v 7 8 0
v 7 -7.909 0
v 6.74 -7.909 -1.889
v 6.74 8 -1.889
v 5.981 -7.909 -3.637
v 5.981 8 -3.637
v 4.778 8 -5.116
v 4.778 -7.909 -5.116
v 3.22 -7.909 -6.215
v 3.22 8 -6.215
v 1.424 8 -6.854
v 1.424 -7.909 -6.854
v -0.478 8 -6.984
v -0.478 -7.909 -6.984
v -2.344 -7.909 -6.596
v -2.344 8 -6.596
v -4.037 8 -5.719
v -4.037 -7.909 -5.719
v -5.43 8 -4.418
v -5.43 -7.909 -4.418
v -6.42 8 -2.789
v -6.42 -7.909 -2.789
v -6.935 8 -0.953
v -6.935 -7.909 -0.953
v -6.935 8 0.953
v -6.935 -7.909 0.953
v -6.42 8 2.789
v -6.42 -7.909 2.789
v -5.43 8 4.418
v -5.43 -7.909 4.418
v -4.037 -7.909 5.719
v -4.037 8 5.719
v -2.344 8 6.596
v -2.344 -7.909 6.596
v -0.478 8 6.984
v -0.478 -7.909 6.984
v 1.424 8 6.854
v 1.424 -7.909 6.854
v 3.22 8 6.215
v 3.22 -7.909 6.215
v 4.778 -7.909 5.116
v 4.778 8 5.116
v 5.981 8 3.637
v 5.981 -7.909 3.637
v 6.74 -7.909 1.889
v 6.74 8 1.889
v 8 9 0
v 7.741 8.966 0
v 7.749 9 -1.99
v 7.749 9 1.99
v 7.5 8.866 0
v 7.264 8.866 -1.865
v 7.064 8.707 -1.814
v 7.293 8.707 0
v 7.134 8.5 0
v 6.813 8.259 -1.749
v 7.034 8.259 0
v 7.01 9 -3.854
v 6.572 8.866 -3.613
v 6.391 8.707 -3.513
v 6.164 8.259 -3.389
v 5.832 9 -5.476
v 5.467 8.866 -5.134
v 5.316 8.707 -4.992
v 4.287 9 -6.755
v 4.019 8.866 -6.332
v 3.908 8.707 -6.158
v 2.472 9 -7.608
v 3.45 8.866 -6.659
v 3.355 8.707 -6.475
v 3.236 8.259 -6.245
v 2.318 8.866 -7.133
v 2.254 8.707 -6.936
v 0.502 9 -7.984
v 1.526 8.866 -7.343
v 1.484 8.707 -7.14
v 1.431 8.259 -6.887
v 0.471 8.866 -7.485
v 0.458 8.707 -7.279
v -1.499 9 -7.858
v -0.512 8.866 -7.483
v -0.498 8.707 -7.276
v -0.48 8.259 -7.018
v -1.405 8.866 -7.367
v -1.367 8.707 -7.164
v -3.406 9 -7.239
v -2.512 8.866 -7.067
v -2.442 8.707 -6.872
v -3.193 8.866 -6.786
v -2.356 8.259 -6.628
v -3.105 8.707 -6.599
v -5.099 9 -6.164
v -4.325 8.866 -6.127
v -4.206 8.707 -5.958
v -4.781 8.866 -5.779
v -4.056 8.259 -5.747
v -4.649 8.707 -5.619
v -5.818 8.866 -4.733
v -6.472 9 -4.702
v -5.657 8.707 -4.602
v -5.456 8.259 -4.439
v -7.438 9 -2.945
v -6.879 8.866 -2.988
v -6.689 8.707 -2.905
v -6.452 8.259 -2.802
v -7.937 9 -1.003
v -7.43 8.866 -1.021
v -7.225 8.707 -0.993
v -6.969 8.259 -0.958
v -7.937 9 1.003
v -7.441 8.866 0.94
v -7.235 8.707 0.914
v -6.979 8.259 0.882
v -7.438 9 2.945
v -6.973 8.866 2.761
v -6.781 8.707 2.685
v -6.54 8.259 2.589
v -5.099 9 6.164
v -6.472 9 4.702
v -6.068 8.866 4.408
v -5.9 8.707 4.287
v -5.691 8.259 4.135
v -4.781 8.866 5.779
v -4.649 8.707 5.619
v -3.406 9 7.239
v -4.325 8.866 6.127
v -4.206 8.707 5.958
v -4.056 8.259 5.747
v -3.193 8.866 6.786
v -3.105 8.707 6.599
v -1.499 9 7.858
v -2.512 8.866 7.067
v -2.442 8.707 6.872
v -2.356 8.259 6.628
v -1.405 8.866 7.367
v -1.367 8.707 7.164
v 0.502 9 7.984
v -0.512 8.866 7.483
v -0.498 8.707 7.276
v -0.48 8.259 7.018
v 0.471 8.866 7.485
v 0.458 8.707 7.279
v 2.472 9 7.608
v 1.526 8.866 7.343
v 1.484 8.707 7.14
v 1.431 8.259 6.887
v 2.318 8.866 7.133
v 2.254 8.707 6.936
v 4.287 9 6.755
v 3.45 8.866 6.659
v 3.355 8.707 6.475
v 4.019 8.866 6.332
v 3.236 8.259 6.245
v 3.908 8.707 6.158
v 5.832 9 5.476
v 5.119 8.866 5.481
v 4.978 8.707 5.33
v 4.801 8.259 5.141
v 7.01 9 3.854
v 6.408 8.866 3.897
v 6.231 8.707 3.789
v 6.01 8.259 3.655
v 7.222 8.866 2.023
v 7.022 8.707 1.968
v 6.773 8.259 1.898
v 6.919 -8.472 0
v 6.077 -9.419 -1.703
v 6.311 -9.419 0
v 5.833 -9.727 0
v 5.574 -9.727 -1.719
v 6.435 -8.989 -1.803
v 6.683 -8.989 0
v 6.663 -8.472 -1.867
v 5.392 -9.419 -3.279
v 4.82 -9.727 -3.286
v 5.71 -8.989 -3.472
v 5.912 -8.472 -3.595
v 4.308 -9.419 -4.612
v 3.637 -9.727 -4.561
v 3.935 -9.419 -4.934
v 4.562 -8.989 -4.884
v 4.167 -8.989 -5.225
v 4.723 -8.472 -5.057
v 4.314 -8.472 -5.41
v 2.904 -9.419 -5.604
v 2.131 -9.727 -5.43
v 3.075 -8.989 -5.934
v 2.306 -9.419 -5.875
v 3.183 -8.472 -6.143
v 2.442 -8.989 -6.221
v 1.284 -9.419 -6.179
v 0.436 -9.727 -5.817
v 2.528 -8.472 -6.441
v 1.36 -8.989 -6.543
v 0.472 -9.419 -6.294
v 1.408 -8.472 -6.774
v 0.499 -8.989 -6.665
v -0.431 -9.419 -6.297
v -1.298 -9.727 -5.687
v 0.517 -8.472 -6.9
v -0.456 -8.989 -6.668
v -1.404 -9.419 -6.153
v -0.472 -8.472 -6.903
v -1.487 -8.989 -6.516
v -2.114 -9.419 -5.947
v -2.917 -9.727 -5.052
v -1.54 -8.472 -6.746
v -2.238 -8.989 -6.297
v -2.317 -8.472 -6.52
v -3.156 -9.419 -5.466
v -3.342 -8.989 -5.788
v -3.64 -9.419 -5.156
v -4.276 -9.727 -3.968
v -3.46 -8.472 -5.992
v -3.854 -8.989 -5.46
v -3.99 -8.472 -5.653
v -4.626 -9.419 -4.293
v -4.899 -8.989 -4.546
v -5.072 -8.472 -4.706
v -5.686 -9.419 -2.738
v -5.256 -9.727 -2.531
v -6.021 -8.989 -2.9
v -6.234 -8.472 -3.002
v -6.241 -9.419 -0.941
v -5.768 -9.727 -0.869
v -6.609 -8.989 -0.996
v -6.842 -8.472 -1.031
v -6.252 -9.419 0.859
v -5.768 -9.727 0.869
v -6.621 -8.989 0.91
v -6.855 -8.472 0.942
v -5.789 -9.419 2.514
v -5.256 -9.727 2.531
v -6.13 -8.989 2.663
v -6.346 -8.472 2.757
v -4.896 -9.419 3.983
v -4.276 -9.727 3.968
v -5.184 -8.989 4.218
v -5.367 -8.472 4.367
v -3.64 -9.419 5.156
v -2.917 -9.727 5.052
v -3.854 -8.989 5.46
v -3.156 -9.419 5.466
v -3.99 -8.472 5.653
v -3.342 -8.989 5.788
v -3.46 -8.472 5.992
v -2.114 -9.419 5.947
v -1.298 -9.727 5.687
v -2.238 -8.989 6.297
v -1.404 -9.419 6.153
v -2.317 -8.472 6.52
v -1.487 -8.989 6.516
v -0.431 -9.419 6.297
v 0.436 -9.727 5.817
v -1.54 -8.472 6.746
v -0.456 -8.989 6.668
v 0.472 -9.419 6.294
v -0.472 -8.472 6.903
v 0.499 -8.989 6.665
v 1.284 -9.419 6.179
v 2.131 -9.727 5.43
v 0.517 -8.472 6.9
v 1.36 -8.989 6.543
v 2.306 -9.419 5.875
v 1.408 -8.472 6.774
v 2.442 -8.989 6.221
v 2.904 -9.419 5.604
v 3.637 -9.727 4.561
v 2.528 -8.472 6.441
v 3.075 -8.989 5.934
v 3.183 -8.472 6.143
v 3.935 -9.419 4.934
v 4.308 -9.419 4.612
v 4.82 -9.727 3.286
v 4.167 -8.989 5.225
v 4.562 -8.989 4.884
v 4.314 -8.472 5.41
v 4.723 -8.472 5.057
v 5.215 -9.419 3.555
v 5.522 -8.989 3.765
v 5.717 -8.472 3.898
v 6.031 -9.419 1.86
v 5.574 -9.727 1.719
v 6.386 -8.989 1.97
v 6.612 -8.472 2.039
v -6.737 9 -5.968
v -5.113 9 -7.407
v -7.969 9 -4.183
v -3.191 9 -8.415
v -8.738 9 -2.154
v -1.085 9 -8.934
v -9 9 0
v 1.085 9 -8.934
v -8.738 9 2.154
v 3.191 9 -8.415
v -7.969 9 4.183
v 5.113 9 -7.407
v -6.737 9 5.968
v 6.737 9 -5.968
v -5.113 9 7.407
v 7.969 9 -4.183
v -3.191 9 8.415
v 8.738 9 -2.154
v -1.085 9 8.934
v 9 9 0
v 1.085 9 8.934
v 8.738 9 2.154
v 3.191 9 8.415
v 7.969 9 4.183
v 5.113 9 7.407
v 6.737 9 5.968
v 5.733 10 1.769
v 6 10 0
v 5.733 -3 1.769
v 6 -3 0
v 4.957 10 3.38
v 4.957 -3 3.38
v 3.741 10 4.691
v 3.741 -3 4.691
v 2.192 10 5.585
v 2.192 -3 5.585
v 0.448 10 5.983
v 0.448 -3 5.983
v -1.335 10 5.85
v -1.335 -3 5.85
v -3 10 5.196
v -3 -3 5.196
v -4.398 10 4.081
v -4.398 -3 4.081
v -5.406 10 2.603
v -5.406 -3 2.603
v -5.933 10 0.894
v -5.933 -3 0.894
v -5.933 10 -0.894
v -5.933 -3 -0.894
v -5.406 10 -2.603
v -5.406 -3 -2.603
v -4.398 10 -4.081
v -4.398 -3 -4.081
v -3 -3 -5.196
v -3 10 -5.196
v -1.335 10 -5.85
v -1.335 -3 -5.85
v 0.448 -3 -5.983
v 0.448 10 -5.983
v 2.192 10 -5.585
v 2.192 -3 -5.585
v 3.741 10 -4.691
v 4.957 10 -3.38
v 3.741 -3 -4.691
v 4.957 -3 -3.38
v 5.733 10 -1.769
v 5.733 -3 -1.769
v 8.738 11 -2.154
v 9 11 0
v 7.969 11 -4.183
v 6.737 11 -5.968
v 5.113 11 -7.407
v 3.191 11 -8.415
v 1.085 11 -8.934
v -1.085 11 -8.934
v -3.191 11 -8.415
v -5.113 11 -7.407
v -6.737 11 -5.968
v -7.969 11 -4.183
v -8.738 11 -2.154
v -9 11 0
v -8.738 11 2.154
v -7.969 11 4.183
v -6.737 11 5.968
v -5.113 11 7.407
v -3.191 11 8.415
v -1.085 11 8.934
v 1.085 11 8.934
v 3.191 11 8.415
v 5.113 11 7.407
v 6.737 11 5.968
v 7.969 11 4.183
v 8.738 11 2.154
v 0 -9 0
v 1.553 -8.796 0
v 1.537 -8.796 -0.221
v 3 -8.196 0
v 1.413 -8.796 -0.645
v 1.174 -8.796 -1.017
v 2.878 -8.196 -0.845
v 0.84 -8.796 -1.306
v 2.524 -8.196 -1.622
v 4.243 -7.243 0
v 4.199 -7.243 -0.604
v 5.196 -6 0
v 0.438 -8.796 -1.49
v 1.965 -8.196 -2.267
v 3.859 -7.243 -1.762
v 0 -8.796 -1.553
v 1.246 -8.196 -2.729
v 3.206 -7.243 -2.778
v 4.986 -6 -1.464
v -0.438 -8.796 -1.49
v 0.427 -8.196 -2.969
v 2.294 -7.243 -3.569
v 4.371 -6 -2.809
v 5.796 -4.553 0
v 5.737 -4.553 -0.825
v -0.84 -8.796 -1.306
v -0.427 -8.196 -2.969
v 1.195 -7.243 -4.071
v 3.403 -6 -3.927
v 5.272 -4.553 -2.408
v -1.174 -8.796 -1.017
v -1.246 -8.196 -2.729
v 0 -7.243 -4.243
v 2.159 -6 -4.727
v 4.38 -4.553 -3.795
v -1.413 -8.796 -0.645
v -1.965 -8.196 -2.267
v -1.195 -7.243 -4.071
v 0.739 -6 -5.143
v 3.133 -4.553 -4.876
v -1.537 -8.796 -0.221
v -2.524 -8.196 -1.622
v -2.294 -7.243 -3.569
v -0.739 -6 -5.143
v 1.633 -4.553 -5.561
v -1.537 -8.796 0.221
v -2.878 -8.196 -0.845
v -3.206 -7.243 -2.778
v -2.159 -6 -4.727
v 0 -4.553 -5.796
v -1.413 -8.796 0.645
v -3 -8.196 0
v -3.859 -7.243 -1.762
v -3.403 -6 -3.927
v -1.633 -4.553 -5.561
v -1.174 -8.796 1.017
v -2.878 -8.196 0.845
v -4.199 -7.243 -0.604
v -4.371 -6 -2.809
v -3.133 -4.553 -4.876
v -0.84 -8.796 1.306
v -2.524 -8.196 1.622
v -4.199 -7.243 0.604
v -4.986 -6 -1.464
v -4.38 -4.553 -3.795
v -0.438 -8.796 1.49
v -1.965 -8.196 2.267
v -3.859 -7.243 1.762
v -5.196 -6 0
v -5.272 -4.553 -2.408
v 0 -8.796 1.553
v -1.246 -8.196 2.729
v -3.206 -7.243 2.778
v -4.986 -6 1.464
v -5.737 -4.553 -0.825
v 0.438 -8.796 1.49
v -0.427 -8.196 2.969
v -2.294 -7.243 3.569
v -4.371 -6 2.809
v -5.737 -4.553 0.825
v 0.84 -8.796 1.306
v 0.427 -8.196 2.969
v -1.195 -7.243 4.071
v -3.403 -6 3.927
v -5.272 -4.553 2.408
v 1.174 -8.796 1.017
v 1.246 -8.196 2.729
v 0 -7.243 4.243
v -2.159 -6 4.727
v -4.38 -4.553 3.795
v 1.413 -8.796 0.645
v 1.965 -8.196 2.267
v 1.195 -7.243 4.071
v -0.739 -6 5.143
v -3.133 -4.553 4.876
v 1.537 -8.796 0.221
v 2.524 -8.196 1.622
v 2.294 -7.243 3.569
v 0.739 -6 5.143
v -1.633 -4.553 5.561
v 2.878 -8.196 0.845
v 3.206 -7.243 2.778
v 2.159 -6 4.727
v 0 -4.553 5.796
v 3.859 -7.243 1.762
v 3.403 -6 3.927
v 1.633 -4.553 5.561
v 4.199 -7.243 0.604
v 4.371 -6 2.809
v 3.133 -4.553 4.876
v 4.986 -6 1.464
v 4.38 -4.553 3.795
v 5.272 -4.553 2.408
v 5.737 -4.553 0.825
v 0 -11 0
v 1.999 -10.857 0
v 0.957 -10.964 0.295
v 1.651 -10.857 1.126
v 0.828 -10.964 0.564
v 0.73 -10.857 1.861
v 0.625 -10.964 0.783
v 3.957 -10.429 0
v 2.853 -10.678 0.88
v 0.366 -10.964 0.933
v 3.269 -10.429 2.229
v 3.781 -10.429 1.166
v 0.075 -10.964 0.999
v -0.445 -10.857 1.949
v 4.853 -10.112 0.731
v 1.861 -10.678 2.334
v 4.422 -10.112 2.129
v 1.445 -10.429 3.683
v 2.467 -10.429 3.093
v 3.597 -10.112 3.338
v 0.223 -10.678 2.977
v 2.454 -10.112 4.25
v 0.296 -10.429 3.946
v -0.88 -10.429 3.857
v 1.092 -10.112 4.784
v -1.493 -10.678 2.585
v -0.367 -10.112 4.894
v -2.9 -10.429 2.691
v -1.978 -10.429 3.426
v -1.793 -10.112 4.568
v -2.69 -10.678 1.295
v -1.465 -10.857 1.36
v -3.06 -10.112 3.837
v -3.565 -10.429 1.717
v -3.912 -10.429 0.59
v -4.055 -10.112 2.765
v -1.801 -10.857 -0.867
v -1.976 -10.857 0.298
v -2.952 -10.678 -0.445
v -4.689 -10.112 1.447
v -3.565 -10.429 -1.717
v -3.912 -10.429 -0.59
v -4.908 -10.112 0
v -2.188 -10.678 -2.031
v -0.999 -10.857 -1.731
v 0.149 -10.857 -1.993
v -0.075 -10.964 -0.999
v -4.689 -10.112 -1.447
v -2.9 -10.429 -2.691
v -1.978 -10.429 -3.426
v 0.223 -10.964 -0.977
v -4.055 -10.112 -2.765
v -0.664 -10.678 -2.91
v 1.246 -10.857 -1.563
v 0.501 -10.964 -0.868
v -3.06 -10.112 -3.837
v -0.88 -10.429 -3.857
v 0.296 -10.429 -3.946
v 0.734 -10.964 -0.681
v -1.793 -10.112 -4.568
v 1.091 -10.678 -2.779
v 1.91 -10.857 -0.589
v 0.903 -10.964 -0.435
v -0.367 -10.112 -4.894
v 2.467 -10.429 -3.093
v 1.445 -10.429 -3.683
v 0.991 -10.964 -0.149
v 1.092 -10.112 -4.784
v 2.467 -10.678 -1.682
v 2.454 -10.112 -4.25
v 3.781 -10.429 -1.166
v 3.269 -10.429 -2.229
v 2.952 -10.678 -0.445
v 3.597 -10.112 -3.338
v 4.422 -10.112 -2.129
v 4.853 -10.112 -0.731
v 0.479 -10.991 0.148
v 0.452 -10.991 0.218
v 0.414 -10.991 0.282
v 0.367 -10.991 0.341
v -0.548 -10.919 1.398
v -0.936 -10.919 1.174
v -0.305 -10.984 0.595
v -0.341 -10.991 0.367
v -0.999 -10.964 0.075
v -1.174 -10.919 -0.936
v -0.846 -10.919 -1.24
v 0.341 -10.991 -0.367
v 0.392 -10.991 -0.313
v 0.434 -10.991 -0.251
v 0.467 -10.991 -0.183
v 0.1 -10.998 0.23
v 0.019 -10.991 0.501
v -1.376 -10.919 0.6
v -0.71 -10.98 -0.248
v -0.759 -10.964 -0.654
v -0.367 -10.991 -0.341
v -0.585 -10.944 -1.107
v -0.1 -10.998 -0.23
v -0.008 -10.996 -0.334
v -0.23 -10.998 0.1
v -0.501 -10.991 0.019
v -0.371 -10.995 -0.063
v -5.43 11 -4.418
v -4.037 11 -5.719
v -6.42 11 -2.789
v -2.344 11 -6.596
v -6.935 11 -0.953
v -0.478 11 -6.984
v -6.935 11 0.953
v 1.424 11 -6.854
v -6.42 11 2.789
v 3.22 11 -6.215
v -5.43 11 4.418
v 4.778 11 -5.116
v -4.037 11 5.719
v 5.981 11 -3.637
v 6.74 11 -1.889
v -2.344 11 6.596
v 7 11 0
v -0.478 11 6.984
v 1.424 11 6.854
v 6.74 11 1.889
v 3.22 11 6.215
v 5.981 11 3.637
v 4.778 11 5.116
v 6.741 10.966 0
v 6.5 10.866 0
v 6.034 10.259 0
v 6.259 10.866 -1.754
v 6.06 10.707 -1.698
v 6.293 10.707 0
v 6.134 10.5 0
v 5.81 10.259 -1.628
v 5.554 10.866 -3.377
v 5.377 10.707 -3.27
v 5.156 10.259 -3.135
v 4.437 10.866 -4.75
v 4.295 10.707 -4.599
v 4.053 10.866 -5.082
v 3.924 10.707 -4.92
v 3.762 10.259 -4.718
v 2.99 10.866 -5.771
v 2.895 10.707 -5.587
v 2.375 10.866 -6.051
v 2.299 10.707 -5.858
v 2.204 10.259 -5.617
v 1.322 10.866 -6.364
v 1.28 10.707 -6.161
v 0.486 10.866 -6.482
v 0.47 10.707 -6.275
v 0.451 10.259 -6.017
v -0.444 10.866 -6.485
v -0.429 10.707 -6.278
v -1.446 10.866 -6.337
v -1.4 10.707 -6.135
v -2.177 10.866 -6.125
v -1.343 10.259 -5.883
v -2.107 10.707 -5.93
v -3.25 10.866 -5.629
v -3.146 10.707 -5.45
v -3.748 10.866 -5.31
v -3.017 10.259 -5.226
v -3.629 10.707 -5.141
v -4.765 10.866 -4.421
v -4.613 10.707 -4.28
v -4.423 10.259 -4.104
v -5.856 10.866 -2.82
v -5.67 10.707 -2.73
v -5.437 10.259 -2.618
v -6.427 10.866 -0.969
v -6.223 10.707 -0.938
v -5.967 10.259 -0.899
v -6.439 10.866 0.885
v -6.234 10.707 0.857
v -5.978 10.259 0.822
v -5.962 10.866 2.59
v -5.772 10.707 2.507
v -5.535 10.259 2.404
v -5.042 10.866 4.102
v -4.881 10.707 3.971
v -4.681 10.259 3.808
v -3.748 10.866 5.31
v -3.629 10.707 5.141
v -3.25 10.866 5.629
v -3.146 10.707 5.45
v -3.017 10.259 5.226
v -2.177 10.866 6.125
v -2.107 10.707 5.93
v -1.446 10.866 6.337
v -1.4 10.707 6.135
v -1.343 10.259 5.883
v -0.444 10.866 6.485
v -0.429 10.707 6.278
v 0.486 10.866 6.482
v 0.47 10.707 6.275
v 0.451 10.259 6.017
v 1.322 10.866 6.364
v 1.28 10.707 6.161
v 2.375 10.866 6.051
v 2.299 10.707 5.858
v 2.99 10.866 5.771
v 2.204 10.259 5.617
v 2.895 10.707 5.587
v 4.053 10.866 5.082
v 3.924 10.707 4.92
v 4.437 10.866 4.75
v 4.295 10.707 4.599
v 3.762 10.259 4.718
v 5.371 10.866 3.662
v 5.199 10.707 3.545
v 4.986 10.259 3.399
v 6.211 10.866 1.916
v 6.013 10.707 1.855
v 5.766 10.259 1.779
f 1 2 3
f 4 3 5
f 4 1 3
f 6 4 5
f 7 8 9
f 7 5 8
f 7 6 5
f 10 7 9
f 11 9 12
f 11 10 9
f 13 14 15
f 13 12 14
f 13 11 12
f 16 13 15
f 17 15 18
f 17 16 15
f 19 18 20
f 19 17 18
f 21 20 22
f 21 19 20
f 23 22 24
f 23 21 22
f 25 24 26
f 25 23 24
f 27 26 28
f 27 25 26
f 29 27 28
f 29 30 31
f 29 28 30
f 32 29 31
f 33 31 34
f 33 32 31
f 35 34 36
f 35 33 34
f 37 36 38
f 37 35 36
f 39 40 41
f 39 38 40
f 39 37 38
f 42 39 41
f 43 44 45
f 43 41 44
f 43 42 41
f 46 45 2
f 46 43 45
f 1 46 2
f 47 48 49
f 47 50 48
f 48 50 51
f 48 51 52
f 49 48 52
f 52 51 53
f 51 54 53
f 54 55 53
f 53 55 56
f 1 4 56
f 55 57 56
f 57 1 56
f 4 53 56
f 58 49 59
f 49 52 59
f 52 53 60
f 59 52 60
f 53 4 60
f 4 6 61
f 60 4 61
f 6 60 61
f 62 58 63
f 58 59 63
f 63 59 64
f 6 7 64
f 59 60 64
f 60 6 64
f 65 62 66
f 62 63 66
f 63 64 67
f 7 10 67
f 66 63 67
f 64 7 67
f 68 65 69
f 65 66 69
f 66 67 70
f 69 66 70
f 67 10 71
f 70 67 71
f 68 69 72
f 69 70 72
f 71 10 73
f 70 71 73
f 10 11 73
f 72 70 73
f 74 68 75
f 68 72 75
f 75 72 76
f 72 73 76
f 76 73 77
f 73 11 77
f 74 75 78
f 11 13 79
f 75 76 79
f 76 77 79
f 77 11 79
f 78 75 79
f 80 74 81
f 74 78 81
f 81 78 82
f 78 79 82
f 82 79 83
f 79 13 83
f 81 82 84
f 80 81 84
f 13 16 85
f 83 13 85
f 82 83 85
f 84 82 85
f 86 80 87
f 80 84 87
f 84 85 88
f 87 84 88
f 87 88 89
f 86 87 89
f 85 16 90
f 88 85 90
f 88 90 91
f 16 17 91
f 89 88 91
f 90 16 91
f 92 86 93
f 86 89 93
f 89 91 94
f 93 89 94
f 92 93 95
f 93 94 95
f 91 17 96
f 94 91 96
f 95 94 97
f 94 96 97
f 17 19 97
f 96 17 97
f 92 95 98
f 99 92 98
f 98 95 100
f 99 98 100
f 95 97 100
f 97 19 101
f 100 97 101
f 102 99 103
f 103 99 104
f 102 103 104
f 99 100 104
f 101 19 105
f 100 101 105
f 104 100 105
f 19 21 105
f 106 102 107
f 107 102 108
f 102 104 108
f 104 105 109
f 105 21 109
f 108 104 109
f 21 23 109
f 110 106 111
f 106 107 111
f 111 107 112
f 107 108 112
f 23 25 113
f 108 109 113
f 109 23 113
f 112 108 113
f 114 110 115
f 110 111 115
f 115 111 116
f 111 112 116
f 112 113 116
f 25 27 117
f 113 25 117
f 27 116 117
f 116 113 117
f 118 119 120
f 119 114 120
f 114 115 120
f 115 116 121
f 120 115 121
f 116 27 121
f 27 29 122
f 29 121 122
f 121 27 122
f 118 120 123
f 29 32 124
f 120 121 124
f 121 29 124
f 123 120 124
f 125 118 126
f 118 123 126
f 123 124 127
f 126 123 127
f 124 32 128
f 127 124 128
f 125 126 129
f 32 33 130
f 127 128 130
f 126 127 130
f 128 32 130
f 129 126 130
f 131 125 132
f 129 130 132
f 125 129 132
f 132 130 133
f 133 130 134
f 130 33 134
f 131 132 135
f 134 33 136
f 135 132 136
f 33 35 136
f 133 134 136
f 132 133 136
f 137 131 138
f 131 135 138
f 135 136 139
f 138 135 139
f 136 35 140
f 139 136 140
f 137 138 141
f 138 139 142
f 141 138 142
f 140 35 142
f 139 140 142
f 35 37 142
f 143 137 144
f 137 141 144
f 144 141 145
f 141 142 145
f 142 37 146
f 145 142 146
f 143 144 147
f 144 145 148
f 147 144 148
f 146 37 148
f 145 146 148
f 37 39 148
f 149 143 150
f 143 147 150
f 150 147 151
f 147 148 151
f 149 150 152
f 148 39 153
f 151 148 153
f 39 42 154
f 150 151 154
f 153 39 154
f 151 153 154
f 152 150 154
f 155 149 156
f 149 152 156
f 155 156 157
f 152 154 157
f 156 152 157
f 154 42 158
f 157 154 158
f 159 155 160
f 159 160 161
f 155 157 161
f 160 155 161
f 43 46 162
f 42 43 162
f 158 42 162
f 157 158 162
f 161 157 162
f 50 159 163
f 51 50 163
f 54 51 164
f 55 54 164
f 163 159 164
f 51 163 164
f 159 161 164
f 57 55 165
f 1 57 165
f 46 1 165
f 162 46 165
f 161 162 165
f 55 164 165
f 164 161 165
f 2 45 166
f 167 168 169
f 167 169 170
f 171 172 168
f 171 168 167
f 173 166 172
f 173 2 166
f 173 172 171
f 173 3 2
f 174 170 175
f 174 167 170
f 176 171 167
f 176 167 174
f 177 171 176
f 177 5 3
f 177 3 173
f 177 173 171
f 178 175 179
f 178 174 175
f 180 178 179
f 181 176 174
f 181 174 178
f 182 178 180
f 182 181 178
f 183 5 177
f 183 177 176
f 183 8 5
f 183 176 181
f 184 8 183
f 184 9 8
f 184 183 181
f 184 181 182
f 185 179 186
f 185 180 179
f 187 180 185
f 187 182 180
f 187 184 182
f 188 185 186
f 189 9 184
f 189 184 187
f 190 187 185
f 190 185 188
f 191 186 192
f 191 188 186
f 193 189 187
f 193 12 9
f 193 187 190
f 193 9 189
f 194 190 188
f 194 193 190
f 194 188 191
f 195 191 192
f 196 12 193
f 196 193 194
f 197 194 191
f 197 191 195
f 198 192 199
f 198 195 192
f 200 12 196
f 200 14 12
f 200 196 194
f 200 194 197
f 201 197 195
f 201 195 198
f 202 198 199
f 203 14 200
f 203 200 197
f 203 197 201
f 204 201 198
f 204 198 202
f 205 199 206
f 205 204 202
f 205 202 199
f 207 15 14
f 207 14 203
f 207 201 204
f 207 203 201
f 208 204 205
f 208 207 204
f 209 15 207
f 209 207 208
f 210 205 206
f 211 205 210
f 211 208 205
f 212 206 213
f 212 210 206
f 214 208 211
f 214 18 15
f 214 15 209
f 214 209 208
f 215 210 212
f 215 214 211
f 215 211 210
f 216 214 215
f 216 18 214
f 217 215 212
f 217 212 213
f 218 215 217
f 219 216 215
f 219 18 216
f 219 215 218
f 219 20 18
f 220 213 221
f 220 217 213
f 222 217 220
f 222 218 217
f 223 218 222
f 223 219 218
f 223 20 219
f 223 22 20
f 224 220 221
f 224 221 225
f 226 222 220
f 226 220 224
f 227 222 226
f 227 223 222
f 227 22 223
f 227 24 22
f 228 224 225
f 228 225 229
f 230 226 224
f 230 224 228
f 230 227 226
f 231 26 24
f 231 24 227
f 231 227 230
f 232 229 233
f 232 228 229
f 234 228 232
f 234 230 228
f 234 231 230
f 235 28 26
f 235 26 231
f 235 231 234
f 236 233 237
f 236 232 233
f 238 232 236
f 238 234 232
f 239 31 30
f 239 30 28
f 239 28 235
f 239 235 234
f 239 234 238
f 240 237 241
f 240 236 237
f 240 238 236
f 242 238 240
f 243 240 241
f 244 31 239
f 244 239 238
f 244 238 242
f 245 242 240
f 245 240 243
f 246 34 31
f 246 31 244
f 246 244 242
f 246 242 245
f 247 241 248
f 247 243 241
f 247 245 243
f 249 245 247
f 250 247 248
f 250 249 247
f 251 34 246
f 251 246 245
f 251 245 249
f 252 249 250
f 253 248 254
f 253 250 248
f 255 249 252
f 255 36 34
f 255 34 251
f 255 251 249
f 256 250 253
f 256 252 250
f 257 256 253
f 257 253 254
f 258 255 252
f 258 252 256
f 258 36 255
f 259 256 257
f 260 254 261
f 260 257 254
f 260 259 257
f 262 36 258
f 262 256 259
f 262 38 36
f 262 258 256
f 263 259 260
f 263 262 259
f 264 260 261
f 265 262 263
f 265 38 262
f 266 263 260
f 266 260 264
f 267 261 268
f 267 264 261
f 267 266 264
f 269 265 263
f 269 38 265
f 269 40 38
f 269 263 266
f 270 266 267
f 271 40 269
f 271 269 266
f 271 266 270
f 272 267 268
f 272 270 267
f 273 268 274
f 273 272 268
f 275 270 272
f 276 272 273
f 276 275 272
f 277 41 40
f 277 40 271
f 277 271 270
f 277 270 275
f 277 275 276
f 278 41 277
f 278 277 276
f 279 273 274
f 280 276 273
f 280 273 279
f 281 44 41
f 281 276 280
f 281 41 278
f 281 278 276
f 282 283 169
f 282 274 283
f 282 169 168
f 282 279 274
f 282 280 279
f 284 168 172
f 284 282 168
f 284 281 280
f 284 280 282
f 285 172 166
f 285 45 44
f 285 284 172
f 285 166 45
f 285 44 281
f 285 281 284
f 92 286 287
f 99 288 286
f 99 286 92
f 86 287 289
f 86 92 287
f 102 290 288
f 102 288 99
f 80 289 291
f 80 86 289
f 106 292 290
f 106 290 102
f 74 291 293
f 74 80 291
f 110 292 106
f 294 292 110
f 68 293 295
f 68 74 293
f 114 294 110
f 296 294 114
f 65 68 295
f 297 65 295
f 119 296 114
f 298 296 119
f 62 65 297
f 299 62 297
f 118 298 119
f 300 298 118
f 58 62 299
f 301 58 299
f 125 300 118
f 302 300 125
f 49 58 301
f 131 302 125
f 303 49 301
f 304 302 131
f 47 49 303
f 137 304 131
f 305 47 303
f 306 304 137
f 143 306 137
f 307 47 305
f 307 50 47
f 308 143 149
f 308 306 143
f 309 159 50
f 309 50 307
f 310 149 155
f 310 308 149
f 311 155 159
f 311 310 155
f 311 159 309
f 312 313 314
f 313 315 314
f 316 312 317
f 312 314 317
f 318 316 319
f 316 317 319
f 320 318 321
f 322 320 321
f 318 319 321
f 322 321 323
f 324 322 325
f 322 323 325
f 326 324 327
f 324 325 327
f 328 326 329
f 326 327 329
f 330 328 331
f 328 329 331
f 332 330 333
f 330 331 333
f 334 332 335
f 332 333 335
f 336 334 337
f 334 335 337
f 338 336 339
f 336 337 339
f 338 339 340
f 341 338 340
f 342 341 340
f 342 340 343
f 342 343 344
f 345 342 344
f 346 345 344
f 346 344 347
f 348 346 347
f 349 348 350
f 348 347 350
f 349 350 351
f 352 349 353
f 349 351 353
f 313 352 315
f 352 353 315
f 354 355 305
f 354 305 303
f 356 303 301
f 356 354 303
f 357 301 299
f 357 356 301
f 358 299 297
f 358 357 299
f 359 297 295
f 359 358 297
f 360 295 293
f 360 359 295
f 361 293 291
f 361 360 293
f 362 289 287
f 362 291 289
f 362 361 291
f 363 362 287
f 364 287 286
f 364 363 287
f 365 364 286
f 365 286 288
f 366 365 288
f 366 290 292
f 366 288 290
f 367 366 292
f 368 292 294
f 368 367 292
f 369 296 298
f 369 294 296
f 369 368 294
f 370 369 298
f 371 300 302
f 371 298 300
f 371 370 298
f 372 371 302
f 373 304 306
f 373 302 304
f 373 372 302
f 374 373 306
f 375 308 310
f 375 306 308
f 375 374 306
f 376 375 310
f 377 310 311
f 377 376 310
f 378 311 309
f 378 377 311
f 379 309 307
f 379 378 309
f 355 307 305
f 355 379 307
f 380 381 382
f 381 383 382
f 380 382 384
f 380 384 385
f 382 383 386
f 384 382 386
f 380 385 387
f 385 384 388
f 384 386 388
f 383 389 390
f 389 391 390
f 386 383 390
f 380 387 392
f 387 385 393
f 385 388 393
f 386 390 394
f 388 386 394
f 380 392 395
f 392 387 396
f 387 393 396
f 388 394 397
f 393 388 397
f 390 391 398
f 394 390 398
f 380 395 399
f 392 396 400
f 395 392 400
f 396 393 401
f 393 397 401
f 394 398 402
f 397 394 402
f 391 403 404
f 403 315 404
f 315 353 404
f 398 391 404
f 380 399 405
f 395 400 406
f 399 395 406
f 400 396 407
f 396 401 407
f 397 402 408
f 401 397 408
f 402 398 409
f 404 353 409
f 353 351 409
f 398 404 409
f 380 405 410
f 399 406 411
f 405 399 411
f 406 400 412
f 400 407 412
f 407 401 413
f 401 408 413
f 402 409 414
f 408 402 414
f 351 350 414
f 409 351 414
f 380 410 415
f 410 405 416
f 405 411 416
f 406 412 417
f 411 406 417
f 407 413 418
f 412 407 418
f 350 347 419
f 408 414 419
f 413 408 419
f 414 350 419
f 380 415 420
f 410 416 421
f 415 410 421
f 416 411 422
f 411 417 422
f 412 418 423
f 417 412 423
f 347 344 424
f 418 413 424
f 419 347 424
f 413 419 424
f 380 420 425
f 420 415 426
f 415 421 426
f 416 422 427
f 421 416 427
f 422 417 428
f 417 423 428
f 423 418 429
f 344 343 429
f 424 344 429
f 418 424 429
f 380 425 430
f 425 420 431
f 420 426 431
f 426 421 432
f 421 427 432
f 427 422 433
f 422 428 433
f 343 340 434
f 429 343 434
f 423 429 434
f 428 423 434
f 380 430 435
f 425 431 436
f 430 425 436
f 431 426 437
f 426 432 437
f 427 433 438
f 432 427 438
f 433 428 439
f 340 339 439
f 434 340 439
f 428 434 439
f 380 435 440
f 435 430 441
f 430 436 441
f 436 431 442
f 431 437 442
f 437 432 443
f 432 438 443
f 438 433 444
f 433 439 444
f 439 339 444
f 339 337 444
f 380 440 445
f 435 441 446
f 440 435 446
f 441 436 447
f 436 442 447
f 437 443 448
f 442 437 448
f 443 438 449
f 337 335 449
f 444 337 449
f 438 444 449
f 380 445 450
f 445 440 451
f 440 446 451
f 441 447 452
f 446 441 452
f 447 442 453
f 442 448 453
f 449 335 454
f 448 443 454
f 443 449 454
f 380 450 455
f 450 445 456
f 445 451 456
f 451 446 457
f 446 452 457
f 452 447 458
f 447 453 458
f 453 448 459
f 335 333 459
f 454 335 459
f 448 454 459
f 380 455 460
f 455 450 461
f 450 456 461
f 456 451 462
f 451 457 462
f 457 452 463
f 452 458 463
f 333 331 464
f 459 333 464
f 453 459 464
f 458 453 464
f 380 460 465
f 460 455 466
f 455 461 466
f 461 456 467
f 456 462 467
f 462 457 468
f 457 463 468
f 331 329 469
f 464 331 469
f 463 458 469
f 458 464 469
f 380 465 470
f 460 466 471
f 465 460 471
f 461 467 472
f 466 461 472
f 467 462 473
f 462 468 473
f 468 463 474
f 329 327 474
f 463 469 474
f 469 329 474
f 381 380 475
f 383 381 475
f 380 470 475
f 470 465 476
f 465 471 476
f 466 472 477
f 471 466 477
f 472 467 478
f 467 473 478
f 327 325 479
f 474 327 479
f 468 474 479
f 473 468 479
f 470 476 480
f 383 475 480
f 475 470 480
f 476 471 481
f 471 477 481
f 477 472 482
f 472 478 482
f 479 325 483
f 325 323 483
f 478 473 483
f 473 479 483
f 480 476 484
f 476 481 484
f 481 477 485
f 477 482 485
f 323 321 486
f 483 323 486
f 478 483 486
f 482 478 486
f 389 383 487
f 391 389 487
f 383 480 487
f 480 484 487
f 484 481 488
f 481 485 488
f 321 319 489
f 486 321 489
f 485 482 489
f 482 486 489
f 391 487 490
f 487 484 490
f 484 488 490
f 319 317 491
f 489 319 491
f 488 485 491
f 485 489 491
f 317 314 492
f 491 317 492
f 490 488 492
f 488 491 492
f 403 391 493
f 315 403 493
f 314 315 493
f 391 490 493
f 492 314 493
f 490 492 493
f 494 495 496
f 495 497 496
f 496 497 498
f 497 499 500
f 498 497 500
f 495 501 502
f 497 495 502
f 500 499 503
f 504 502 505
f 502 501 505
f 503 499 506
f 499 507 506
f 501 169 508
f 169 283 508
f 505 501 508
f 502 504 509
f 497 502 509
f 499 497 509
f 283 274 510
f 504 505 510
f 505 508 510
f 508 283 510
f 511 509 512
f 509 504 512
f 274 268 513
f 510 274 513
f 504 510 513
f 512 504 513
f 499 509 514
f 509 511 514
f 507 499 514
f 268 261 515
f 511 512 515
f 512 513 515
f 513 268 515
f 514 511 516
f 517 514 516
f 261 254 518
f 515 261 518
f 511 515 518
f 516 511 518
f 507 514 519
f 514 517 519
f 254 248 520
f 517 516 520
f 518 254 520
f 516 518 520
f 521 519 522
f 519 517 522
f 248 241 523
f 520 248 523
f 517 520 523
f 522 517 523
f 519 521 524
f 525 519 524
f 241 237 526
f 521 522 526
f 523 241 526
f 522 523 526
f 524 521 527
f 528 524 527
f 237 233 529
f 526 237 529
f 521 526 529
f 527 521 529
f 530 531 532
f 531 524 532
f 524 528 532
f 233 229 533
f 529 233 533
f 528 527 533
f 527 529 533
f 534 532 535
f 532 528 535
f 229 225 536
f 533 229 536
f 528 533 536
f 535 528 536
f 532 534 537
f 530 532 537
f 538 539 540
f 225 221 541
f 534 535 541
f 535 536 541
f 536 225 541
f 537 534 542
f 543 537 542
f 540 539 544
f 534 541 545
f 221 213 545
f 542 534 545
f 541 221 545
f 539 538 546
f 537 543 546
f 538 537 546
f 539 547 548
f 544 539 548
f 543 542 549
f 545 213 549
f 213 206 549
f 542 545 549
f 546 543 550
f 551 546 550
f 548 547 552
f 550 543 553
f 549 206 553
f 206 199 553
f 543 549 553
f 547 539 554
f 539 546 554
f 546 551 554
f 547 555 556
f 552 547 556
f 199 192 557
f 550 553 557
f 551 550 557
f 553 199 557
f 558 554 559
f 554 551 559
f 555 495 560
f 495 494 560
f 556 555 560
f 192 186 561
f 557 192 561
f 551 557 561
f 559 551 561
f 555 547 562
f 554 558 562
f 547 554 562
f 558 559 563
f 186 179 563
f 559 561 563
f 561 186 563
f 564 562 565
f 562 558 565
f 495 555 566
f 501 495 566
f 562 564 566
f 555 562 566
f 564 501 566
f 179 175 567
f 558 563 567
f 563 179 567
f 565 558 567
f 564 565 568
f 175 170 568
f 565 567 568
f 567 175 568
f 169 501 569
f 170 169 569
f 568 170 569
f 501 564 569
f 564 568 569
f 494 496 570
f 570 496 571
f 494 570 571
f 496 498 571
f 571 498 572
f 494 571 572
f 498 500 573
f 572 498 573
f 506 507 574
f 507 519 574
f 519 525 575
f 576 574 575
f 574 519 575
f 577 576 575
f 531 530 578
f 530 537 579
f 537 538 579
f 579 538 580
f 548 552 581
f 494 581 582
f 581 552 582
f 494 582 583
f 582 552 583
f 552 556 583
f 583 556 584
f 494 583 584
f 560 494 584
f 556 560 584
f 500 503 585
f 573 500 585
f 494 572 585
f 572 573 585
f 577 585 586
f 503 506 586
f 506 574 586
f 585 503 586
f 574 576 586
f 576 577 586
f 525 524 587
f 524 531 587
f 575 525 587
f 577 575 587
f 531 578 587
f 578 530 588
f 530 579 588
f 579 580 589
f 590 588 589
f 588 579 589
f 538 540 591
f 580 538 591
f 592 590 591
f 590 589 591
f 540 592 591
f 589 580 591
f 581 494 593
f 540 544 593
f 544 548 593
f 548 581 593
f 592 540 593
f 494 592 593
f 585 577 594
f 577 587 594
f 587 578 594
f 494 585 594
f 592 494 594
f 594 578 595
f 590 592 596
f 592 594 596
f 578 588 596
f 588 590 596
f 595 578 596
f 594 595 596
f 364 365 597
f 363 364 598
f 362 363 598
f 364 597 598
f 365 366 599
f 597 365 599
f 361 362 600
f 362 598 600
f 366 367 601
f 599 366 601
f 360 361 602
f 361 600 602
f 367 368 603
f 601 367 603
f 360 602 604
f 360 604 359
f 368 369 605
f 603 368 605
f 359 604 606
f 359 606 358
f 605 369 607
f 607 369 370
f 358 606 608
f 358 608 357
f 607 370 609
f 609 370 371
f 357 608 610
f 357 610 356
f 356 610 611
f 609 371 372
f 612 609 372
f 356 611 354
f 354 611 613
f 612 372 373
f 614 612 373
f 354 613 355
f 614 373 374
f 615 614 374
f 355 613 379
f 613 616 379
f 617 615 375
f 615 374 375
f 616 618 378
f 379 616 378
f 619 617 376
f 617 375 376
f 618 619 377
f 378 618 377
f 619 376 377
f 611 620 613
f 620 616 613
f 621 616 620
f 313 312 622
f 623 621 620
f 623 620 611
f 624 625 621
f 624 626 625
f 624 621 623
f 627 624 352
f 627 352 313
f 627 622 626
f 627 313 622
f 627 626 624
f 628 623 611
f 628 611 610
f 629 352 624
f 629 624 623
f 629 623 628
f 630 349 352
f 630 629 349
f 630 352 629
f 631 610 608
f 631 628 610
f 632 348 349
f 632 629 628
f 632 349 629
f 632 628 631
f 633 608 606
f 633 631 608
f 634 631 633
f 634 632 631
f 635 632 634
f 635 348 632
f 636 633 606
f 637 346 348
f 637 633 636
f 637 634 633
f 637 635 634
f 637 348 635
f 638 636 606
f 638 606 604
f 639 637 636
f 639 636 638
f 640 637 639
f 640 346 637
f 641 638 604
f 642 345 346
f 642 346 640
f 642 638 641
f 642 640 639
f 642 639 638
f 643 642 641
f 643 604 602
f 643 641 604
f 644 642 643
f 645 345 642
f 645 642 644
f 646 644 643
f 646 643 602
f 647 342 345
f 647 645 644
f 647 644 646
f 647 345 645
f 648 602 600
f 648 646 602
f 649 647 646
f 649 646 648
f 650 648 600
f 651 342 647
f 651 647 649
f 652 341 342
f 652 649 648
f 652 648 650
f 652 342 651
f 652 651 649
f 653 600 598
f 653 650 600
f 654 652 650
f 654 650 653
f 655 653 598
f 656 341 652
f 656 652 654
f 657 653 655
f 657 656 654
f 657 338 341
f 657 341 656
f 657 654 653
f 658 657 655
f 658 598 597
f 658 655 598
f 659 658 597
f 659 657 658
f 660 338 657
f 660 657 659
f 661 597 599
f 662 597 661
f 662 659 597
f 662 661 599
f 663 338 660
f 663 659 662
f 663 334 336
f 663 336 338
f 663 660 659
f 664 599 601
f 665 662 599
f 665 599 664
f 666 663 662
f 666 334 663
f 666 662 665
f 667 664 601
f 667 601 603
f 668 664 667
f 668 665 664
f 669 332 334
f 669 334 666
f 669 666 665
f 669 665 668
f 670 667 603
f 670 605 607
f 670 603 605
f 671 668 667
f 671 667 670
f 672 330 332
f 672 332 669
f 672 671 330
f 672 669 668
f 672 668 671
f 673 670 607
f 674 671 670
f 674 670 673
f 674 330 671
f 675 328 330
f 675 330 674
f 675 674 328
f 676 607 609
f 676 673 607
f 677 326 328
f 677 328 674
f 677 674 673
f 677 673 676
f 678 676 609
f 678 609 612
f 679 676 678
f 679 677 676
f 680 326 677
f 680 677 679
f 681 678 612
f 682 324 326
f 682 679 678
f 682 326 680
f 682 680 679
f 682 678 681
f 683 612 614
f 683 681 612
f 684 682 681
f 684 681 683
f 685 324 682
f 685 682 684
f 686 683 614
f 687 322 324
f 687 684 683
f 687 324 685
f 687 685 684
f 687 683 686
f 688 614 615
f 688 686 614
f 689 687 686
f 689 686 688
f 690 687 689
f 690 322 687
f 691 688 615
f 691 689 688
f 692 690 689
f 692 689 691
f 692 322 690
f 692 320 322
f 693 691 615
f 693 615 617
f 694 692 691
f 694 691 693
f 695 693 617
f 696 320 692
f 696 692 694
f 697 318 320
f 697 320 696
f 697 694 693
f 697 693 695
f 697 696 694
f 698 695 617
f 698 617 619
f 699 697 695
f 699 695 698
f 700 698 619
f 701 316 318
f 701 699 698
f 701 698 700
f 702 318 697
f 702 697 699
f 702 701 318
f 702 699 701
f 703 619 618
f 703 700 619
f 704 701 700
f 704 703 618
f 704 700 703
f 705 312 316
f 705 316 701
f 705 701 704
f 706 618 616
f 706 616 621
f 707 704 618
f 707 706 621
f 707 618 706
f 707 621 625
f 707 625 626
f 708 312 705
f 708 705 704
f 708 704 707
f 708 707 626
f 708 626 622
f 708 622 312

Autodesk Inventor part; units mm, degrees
ref_plane "YZ Plane" through (0, 0, 0) normal (1, 0, 0) x (0, 1, 0)
ref_plane "XZ Plane" through (0, 0, 0) normal (0, 1, 0) x (-1, 0, 0)
ref_plane "XY Plane" through (0, 0, 0) normal (0, 0, 1) x (1, 0, 0)
sketch "Эскиз1" plane through (0, 0, 0) normal (0, 0, 1) x (1, 0, 0)
  line L0 (0, 11) -> (0, -11)
  arc A0 (0, -11) -> (5.8333, -9.7268) centre (0, 3) ccw
  arc A1 (5.8333, -9.7268) -> (7, -7.9087) centre (5, -7.9087) ccw
  line L1 (7, -7.9087) -> (7, 8)
  line L2 (8, 9) -> (9, 9)
  line L3 (9, 9) -> (9, 11)
  line L4 (9, 11) -> (7, 11)
  arc A2 (8, 9) -> (7, 8) centre (8, 8) ccw
  line L5 (6, 10) -> (6, -3)
  arc A3 (0, -9) -> (6, -3) centre (0, -3) ccw
  arc A4 (7, 11) -> (6, 10) centre (7, 10) ccw
  arc A5 (6, -3) -> (6, -3) centre (8, -3) ccw
  line L6 (0, -9) -> (0, -11)
  point P0 (0, 0)
  point P1 (0, 0)
  point P2 (6, -3)
  dimension "d0" = 22
  dimension "d1" = 14
  dimension "d2" = 2
  dimension "d4" = 14
  dimension "d5" = 1
  dimension "d6" = 18
  dimension "d7" = 1
  dimension "d8" = 2
  dimension "d9" = 2
  dimension "d10" = 2
  dimension "d11" = 1
revolve "Вращение1" add sketch "Эскиз1" angle 360 about axis through (0, 11, 0) along (0, -1, 0) picked at (6.6667, -3) contours A3 A5 L1 A1 A0 L0 | L5 A4 L4 L3 L2 A2 L1 A5 | A5 L1
properties part number "79. Предохранитель заднего хода"
